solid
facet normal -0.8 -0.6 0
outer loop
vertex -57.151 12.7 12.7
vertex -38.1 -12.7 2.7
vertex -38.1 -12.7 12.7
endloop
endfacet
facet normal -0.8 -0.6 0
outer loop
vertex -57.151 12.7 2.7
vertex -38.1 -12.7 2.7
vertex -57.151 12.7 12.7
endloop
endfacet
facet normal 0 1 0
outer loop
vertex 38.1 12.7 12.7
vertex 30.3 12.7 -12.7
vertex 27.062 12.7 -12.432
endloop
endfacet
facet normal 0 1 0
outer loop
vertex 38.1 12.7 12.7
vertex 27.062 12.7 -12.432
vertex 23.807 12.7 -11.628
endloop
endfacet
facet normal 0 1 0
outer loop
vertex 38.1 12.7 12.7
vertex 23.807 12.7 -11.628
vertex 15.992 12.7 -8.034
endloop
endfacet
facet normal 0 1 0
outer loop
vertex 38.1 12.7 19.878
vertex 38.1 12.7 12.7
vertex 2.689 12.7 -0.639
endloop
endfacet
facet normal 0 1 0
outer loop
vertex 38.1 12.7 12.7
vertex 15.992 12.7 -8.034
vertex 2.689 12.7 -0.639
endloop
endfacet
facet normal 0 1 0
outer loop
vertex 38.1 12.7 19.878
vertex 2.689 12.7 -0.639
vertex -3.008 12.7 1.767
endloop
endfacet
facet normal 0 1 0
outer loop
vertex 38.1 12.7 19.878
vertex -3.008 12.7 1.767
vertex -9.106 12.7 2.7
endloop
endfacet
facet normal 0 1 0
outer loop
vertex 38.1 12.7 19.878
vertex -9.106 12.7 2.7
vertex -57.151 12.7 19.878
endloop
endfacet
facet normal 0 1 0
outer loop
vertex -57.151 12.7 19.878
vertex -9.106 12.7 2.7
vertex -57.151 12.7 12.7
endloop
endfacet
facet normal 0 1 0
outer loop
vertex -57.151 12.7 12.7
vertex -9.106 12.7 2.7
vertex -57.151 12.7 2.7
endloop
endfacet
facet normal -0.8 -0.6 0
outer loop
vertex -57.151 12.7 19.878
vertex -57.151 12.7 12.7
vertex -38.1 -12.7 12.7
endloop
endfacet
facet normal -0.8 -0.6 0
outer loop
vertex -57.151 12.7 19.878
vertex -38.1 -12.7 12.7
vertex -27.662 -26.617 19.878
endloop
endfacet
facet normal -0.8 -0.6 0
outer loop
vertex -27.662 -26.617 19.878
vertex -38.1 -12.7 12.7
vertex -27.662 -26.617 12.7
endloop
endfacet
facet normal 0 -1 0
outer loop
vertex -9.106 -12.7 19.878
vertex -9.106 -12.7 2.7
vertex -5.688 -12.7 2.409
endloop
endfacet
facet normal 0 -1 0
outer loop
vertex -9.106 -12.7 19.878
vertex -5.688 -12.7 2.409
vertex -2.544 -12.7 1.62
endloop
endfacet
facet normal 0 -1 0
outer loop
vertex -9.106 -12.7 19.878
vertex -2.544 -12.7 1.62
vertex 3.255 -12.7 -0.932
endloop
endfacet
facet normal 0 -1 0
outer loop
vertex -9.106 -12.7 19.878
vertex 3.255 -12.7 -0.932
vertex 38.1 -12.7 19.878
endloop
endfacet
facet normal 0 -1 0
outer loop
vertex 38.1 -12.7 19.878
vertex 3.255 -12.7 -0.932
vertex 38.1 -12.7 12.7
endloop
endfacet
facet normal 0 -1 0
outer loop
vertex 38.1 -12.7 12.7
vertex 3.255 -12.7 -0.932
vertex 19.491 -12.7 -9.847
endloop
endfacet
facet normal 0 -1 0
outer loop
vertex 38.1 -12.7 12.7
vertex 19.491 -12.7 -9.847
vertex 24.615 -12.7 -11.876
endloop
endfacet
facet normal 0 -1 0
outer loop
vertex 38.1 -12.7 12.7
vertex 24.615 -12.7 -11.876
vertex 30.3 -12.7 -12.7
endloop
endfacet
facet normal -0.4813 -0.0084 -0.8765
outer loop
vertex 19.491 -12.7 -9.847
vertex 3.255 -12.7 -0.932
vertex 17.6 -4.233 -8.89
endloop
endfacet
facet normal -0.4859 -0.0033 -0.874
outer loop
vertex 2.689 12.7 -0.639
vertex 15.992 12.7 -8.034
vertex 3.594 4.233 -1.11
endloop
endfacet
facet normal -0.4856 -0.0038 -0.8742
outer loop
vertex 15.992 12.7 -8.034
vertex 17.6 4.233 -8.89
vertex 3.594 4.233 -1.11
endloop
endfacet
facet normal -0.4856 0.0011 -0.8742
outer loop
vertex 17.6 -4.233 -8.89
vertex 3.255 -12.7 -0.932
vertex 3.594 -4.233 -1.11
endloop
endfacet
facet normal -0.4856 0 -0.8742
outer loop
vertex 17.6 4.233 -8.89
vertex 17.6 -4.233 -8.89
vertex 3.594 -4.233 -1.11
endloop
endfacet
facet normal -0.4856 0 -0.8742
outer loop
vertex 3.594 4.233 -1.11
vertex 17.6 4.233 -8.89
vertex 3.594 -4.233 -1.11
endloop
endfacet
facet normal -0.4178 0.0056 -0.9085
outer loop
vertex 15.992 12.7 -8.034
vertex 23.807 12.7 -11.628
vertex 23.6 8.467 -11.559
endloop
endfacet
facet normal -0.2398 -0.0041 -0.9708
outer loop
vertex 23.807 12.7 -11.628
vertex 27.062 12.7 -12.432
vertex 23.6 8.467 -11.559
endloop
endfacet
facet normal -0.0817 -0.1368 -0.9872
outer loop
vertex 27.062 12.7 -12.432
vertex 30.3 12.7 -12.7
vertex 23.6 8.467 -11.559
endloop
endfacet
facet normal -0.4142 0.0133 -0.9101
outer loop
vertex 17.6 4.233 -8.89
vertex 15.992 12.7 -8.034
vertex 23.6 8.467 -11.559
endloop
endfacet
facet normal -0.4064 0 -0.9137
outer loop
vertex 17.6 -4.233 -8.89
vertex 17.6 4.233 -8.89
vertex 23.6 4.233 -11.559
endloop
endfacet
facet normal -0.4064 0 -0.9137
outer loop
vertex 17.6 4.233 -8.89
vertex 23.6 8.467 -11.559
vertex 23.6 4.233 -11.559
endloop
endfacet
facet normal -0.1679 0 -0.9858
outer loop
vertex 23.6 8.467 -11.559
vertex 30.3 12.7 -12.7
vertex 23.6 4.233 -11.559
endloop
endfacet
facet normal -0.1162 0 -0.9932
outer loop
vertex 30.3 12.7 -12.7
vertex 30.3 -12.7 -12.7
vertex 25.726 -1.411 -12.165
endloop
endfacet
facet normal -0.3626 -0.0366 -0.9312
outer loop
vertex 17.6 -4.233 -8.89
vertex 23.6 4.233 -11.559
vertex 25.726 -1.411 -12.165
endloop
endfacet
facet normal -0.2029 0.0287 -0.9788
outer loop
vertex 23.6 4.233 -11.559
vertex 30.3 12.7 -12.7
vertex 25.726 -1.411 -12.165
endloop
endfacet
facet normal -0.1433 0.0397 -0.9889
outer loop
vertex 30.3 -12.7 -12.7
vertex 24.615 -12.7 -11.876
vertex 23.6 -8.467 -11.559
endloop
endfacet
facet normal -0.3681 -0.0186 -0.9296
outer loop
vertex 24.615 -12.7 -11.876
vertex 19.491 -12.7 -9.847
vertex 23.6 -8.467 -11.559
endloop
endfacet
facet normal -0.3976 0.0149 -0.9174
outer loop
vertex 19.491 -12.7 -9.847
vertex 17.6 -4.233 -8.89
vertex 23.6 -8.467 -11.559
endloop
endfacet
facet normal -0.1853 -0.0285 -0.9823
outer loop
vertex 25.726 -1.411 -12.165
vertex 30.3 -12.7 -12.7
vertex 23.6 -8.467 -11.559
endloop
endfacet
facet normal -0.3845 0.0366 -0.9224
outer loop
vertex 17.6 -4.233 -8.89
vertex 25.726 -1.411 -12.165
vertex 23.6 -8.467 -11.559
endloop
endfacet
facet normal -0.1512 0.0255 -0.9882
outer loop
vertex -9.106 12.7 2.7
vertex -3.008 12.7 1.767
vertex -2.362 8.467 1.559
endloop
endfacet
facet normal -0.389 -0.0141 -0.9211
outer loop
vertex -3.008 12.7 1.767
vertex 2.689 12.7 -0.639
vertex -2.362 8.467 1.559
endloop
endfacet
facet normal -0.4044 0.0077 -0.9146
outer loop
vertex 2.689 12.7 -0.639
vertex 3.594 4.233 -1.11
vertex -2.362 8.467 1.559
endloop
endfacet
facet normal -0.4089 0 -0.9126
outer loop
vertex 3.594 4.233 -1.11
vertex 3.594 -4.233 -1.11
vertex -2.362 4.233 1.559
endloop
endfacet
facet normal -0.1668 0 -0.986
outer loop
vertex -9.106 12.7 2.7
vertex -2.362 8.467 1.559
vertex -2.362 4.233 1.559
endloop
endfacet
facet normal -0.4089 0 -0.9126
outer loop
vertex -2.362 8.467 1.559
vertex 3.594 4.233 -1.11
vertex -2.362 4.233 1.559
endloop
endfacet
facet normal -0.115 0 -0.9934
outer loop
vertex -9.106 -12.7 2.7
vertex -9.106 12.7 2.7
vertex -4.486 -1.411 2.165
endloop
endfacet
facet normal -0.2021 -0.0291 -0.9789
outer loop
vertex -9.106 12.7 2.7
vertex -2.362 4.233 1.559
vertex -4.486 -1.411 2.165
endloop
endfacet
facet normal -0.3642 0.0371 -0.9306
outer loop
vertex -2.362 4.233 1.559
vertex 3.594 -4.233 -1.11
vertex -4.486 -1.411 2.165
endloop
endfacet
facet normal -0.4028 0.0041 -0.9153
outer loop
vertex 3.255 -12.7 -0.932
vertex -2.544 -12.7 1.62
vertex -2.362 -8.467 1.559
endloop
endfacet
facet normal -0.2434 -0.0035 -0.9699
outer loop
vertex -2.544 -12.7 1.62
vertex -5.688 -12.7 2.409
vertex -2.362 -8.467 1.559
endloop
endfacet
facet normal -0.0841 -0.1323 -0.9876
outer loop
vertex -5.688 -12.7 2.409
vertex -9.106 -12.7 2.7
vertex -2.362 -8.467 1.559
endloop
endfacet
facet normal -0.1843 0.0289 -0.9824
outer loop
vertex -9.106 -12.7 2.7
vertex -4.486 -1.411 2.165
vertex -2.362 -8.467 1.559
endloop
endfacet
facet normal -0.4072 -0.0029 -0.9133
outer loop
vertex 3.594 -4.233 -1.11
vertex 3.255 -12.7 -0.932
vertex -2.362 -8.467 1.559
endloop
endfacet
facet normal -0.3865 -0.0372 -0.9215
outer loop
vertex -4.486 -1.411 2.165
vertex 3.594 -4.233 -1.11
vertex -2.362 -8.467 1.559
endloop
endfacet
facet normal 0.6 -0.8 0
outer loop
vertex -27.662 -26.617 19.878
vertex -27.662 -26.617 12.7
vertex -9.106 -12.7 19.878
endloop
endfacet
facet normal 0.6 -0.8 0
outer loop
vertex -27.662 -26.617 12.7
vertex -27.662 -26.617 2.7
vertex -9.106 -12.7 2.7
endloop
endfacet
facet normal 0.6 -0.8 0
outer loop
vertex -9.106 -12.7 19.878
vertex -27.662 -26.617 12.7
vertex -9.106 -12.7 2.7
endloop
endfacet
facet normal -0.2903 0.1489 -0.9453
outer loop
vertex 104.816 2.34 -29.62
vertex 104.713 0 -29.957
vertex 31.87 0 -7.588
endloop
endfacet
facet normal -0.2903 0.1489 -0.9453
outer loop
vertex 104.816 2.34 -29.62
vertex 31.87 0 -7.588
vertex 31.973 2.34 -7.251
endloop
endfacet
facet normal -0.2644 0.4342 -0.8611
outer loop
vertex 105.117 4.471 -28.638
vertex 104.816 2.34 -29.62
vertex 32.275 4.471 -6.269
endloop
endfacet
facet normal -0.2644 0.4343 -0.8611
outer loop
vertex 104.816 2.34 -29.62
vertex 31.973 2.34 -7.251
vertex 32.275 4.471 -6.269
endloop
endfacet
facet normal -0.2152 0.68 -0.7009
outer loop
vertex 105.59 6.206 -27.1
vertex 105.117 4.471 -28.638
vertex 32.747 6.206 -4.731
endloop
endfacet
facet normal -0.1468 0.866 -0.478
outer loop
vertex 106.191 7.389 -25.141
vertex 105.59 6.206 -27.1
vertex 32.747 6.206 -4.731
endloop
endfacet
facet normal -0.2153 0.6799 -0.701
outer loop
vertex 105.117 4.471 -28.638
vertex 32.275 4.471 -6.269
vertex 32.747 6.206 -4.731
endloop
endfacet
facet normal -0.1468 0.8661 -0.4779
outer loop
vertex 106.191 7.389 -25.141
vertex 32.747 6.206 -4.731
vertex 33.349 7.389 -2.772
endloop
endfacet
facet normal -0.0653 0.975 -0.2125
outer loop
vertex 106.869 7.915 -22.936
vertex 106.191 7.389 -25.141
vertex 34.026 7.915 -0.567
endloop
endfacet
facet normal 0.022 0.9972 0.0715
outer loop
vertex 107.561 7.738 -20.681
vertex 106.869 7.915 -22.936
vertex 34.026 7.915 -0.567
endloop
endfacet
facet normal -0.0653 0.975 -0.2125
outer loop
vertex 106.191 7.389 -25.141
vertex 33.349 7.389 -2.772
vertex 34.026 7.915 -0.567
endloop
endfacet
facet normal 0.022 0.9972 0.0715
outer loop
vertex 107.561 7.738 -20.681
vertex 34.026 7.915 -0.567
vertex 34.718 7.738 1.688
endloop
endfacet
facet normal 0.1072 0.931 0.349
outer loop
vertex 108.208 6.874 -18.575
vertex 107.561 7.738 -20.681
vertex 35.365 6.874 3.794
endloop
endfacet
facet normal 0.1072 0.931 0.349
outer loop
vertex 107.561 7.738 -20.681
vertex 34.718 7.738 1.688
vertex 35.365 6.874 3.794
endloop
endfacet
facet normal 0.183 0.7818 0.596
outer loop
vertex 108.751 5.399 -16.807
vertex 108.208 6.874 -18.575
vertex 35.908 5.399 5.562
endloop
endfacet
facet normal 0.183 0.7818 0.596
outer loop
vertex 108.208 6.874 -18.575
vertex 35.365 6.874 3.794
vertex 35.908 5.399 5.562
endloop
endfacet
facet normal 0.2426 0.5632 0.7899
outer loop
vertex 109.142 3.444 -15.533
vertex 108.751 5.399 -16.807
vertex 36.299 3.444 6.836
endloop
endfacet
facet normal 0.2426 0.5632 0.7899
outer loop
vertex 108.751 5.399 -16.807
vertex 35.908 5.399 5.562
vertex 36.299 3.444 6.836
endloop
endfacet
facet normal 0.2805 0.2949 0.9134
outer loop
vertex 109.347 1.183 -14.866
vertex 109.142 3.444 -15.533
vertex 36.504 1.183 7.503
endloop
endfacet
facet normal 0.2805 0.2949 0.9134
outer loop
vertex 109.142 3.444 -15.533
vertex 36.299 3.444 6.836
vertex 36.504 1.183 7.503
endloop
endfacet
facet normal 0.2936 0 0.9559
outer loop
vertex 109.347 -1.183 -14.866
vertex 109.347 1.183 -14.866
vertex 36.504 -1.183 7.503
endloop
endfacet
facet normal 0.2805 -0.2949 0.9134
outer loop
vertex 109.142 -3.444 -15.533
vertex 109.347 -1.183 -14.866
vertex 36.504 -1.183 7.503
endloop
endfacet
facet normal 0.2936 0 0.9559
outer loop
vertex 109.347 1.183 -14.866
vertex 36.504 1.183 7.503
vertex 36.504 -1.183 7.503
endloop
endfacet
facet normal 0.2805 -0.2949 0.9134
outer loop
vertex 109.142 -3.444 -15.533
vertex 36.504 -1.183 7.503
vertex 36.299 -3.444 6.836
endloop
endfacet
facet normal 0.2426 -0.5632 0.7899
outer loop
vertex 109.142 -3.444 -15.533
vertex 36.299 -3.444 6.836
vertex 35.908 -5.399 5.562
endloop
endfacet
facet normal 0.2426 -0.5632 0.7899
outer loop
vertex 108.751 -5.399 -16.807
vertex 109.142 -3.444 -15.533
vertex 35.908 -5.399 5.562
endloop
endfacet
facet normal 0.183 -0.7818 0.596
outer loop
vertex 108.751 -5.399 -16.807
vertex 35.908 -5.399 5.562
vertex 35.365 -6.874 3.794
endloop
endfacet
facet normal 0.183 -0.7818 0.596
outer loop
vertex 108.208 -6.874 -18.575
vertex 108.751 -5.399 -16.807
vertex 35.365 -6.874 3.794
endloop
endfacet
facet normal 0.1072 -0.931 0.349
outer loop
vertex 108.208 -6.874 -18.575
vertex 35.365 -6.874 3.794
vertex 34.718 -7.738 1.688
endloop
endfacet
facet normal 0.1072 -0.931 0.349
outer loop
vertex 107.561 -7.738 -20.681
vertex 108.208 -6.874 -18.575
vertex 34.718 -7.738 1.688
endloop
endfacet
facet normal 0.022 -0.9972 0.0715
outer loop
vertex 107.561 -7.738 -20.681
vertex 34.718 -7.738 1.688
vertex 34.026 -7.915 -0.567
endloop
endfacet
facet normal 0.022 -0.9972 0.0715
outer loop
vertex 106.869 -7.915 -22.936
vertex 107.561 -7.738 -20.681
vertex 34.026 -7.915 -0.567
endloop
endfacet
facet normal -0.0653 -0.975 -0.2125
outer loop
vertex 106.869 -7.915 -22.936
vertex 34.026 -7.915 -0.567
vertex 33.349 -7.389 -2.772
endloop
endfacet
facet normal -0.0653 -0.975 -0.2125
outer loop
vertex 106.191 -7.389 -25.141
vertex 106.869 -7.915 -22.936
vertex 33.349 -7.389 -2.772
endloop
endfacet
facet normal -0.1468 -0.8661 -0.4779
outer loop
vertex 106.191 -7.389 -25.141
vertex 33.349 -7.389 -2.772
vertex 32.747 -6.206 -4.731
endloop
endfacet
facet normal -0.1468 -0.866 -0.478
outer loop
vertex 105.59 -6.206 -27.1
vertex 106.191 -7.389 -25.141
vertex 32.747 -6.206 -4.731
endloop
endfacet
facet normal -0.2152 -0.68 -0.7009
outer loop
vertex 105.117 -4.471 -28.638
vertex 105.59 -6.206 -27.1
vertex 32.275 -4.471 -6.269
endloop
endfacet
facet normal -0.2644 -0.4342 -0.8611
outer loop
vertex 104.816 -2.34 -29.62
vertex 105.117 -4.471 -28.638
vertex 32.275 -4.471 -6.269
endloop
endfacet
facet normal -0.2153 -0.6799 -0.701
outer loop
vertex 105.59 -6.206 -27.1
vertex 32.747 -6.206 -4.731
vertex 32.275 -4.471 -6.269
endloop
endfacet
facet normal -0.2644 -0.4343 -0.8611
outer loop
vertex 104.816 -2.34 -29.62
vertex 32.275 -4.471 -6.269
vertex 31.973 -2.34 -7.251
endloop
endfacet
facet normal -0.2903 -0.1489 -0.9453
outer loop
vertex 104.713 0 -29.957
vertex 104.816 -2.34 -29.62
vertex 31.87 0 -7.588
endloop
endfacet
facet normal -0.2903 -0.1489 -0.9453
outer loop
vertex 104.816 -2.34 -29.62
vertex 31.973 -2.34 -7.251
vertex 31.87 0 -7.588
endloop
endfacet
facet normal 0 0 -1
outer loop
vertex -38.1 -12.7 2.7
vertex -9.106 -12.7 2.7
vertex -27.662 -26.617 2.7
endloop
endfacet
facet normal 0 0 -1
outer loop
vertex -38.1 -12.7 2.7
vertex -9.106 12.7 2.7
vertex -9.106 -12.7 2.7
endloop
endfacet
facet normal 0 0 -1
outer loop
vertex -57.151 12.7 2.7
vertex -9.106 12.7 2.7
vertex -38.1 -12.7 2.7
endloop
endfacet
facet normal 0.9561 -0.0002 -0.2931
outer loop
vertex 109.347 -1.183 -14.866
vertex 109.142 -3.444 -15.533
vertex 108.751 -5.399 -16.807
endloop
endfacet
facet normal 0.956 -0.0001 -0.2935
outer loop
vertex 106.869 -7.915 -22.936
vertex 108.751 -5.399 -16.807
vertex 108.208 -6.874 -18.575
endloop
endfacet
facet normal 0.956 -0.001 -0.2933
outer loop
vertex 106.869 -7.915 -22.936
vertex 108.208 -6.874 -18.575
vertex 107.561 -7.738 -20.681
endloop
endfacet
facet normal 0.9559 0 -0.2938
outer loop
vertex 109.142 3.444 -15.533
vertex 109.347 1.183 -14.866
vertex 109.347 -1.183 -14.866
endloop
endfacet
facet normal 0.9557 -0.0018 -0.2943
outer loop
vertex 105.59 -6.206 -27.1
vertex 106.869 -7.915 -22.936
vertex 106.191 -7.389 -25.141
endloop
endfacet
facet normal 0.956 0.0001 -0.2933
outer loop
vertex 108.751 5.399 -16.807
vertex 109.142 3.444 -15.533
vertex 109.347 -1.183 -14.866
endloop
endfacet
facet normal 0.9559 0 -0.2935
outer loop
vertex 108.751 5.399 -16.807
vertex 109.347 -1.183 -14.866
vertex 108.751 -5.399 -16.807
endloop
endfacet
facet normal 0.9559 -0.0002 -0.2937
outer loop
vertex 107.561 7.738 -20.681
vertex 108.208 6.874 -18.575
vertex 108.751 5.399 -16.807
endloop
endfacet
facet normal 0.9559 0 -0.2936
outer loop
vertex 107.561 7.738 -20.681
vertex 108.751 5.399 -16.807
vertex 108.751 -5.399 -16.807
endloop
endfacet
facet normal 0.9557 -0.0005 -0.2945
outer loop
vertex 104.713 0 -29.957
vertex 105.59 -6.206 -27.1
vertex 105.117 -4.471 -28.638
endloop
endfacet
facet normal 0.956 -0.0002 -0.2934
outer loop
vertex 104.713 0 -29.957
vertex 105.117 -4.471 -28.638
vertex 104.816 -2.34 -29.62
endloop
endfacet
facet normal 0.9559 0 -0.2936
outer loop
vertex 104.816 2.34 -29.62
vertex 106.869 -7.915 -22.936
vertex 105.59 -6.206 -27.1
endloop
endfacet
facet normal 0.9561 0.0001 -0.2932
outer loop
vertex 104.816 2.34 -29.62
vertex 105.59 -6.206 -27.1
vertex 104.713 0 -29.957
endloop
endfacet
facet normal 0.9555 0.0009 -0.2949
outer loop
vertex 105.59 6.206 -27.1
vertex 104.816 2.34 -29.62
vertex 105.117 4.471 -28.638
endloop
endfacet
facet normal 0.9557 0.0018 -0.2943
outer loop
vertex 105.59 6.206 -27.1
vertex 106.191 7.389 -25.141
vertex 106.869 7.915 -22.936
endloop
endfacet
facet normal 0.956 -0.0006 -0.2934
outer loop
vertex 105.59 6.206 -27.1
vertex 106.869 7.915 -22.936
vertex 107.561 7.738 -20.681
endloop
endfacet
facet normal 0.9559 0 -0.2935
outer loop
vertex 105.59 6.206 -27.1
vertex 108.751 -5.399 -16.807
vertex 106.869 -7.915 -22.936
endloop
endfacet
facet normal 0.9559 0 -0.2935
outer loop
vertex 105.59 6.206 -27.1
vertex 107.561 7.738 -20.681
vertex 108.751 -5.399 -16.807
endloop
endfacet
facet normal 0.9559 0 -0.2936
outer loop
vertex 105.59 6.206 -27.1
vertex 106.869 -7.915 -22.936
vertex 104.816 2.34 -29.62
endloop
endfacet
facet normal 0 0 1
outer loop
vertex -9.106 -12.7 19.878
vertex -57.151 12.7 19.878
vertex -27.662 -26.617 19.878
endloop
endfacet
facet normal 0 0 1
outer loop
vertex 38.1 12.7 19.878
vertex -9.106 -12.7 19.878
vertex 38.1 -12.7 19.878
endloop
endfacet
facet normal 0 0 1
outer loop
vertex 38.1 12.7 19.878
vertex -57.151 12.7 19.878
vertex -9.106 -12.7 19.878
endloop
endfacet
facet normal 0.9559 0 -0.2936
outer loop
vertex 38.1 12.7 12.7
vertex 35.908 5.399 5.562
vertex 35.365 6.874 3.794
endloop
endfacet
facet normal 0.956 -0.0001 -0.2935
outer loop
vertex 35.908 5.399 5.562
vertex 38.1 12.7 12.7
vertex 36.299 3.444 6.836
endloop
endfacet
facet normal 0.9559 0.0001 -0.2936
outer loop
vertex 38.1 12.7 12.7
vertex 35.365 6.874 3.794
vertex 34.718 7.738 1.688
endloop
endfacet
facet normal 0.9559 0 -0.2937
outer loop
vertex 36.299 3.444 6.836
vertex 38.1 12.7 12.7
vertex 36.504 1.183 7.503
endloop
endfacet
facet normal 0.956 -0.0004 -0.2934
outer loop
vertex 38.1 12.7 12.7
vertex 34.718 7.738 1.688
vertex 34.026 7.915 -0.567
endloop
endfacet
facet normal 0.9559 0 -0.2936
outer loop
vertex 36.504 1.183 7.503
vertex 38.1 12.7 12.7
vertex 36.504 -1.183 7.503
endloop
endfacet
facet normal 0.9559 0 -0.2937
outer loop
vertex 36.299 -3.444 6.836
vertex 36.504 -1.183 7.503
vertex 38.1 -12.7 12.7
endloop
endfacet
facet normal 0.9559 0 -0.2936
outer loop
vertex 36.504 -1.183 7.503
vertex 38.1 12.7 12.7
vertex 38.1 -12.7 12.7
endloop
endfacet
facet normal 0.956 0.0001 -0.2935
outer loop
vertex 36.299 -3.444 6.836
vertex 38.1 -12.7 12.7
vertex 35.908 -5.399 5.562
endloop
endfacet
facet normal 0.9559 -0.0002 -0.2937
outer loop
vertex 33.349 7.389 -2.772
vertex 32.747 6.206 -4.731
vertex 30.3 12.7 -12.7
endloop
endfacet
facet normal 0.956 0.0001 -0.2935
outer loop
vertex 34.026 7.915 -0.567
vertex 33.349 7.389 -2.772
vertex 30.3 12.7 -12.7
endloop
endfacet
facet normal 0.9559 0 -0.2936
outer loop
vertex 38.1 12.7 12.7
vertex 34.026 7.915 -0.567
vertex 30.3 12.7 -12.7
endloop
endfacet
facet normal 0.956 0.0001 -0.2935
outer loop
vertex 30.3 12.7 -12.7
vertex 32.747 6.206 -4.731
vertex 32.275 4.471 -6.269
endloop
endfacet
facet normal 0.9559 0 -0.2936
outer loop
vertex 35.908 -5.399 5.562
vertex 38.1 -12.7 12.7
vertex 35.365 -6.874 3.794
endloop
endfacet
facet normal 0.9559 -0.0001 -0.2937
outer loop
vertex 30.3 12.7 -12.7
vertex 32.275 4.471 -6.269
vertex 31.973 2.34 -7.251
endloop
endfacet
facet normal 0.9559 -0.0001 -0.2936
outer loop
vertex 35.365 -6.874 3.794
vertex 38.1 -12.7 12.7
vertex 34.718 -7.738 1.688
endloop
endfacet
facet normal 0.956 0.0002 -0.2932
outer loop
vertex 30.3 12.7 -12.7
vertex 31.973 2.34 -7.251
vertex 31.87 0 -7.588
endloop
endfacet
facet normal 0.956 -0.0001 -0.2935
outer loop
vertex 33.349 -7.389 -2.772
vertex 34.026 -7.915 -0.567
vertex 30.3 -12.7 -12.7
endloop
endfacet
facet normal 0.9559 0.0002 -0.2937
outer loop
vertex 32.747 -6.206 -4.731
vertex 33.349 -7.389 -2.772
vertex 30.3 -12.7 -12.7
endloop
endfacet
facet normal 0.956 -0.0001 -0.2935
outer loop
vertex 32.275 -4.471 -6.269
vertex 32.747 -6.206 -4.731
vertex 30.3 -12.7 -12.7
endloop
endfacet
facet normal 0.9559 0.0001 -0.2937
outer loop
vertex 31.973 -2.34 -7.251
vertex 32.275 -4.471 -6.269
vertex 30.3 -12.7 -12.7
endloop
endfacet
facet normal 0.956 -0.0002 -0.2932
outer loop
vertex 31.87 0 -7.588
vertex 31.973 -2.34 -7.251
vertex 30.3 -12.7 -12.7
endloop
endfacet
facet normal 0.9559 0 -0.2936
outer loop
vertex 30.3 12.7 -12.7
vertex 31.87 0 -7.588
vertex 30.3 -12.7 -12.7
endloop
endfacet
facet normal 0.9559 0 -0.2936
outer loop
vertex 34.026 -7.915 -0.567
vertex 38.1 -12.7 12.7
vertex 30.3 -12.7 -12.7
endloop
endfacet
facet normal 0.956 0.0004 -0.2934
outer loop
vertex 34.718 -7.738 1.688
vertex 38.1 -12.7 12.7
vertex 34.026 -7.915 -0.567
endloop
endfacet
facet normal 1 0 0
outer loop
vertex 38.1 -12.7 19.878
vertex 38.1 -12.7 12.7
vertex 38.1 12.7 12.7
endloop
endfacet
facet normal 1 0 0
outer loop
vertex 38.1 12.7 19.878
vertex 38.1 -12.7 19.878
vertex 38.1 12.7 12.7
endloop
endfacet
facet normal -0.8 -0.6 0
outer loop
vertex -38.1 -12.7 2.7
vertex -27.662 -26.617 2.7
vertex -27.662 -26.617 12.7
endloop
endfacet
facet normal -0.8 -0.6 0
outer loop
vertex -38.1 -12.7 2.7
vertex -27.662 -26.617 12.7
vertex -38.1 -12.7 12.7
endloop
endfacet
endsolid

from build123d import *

# Parameters (mm, degrees)
BOSS_EXTRUDE1_DEPTH      = 12.7
BOSS_EXTRUDE1_DEPTH_BACK = 12.7
SKETCH1_W                = 76.2
SKETCH1_H                = 25.4
CUT_EXTRUDE1_DEPTH       = 48.519048812
SKETCH4_R                = 7.9375
BOSS_EXTRUDE2_DEPTH      = 76.2
BOSS_EXTRUDE3_DEPTH      = 10
BOSS_EXTRUDE5_DEPTH      = 7.178167


with BuildPart() as part:
    # Sketch1 → Boss-Extrude1 (new, two sides: drawn at the far end of the back side and taken through both)
    with BuildSketch(Plane.XY.offset(-BOSS_EXTRUDE1_DEPTH_BACK)):
        Rectangle(SKETCH1_W, SKETCH1_H)
    extrude(amount=BOSS_EXTRUDE1_DEPTH + BOSS_EXTRUDE1_DEPTH_BACK)

    # Sketch2 → Cut-Extrude1 (cut, through all)
    with BuildSketch(Plane.XZ.offset(12.7)):
        Polygon((34.199985956, 0), (30.299971912, -12.7), (38.1, -12.7), (38.1, -1.197646421), align=None)
        Polygon((38.1, 12.7), (34.199985956, 0), (38.1, -1.197646421), align=None)
        with BuildLine():
            Line((30.299971912, -12.7), (-38.1, -12.7))
            Line((-38.1, -12.7), (-38.1, 2.7))
            Line((-38.1, 2.7), (-9.105646135, 2.7))
            add(Edge.make_bspline(
                [(30.299971912, -12.7), (25.466803171, -12.7), (16.707798139, -8.78817181), (4.449206283, -1.21182819), (-4.185142014, 2.7), (-9.105646135, 2.7)],
                knots=[0, 0, 0, 0, 0.311689084, 0.688310916, 1, 1, 1, 1], degree=3))
        make_face()
    extrude(amount=-CUT_EXTRUDE1_DEPTH, mode=Mode.SUBTRACT)

    # Sketch4 → Boss-Extrude2 (add)
    with BuildSketch(Plane(origin=(31.252760971, 0, -9.59733911), x_dir=(-0.2935578385035089, 0, -0.95594131381228), z_dir=(0.95594131381228, 0, -0.2935578385035089))):
        with Locations((-10.039678032, 0)):
            Circle(SKETCH4_R)
    extrude(amount=BOSS_EXTRUDE2_DEPTH)

    # Sketch5 → Boss-Extrude3 (add)
    with BuildSketch(Plane(origin=(0, 0, 2.7), x_dir=(-1, 0, 0), z_dir=(0, 0, -1))):
        Polygon((9.105646135, -12.7), (27.661608652, -26.617413502), (38.1, -12.7), align=None)
        Polygon((38.1, -12.7), (57.150604496, 12.7), (38.1, 12.7), align=None)
    extrude(amount=-BOSS_EXTRUDE3_DEPTH)

    # Sketch7 → Boss-Extrude5 (add)
    with BuildSketch(Plane.XY.offset(12.7)):
        Polygon((-57.150604496, 12.7), (-27.661608652, -26.617413502), (-9.105646135, -12.7), (38.1, -12.7), (38.1, 12.7), align=None)
    extrude(amount=BOSS_EXTRUDE5_DEPTH)


solid = part.part
